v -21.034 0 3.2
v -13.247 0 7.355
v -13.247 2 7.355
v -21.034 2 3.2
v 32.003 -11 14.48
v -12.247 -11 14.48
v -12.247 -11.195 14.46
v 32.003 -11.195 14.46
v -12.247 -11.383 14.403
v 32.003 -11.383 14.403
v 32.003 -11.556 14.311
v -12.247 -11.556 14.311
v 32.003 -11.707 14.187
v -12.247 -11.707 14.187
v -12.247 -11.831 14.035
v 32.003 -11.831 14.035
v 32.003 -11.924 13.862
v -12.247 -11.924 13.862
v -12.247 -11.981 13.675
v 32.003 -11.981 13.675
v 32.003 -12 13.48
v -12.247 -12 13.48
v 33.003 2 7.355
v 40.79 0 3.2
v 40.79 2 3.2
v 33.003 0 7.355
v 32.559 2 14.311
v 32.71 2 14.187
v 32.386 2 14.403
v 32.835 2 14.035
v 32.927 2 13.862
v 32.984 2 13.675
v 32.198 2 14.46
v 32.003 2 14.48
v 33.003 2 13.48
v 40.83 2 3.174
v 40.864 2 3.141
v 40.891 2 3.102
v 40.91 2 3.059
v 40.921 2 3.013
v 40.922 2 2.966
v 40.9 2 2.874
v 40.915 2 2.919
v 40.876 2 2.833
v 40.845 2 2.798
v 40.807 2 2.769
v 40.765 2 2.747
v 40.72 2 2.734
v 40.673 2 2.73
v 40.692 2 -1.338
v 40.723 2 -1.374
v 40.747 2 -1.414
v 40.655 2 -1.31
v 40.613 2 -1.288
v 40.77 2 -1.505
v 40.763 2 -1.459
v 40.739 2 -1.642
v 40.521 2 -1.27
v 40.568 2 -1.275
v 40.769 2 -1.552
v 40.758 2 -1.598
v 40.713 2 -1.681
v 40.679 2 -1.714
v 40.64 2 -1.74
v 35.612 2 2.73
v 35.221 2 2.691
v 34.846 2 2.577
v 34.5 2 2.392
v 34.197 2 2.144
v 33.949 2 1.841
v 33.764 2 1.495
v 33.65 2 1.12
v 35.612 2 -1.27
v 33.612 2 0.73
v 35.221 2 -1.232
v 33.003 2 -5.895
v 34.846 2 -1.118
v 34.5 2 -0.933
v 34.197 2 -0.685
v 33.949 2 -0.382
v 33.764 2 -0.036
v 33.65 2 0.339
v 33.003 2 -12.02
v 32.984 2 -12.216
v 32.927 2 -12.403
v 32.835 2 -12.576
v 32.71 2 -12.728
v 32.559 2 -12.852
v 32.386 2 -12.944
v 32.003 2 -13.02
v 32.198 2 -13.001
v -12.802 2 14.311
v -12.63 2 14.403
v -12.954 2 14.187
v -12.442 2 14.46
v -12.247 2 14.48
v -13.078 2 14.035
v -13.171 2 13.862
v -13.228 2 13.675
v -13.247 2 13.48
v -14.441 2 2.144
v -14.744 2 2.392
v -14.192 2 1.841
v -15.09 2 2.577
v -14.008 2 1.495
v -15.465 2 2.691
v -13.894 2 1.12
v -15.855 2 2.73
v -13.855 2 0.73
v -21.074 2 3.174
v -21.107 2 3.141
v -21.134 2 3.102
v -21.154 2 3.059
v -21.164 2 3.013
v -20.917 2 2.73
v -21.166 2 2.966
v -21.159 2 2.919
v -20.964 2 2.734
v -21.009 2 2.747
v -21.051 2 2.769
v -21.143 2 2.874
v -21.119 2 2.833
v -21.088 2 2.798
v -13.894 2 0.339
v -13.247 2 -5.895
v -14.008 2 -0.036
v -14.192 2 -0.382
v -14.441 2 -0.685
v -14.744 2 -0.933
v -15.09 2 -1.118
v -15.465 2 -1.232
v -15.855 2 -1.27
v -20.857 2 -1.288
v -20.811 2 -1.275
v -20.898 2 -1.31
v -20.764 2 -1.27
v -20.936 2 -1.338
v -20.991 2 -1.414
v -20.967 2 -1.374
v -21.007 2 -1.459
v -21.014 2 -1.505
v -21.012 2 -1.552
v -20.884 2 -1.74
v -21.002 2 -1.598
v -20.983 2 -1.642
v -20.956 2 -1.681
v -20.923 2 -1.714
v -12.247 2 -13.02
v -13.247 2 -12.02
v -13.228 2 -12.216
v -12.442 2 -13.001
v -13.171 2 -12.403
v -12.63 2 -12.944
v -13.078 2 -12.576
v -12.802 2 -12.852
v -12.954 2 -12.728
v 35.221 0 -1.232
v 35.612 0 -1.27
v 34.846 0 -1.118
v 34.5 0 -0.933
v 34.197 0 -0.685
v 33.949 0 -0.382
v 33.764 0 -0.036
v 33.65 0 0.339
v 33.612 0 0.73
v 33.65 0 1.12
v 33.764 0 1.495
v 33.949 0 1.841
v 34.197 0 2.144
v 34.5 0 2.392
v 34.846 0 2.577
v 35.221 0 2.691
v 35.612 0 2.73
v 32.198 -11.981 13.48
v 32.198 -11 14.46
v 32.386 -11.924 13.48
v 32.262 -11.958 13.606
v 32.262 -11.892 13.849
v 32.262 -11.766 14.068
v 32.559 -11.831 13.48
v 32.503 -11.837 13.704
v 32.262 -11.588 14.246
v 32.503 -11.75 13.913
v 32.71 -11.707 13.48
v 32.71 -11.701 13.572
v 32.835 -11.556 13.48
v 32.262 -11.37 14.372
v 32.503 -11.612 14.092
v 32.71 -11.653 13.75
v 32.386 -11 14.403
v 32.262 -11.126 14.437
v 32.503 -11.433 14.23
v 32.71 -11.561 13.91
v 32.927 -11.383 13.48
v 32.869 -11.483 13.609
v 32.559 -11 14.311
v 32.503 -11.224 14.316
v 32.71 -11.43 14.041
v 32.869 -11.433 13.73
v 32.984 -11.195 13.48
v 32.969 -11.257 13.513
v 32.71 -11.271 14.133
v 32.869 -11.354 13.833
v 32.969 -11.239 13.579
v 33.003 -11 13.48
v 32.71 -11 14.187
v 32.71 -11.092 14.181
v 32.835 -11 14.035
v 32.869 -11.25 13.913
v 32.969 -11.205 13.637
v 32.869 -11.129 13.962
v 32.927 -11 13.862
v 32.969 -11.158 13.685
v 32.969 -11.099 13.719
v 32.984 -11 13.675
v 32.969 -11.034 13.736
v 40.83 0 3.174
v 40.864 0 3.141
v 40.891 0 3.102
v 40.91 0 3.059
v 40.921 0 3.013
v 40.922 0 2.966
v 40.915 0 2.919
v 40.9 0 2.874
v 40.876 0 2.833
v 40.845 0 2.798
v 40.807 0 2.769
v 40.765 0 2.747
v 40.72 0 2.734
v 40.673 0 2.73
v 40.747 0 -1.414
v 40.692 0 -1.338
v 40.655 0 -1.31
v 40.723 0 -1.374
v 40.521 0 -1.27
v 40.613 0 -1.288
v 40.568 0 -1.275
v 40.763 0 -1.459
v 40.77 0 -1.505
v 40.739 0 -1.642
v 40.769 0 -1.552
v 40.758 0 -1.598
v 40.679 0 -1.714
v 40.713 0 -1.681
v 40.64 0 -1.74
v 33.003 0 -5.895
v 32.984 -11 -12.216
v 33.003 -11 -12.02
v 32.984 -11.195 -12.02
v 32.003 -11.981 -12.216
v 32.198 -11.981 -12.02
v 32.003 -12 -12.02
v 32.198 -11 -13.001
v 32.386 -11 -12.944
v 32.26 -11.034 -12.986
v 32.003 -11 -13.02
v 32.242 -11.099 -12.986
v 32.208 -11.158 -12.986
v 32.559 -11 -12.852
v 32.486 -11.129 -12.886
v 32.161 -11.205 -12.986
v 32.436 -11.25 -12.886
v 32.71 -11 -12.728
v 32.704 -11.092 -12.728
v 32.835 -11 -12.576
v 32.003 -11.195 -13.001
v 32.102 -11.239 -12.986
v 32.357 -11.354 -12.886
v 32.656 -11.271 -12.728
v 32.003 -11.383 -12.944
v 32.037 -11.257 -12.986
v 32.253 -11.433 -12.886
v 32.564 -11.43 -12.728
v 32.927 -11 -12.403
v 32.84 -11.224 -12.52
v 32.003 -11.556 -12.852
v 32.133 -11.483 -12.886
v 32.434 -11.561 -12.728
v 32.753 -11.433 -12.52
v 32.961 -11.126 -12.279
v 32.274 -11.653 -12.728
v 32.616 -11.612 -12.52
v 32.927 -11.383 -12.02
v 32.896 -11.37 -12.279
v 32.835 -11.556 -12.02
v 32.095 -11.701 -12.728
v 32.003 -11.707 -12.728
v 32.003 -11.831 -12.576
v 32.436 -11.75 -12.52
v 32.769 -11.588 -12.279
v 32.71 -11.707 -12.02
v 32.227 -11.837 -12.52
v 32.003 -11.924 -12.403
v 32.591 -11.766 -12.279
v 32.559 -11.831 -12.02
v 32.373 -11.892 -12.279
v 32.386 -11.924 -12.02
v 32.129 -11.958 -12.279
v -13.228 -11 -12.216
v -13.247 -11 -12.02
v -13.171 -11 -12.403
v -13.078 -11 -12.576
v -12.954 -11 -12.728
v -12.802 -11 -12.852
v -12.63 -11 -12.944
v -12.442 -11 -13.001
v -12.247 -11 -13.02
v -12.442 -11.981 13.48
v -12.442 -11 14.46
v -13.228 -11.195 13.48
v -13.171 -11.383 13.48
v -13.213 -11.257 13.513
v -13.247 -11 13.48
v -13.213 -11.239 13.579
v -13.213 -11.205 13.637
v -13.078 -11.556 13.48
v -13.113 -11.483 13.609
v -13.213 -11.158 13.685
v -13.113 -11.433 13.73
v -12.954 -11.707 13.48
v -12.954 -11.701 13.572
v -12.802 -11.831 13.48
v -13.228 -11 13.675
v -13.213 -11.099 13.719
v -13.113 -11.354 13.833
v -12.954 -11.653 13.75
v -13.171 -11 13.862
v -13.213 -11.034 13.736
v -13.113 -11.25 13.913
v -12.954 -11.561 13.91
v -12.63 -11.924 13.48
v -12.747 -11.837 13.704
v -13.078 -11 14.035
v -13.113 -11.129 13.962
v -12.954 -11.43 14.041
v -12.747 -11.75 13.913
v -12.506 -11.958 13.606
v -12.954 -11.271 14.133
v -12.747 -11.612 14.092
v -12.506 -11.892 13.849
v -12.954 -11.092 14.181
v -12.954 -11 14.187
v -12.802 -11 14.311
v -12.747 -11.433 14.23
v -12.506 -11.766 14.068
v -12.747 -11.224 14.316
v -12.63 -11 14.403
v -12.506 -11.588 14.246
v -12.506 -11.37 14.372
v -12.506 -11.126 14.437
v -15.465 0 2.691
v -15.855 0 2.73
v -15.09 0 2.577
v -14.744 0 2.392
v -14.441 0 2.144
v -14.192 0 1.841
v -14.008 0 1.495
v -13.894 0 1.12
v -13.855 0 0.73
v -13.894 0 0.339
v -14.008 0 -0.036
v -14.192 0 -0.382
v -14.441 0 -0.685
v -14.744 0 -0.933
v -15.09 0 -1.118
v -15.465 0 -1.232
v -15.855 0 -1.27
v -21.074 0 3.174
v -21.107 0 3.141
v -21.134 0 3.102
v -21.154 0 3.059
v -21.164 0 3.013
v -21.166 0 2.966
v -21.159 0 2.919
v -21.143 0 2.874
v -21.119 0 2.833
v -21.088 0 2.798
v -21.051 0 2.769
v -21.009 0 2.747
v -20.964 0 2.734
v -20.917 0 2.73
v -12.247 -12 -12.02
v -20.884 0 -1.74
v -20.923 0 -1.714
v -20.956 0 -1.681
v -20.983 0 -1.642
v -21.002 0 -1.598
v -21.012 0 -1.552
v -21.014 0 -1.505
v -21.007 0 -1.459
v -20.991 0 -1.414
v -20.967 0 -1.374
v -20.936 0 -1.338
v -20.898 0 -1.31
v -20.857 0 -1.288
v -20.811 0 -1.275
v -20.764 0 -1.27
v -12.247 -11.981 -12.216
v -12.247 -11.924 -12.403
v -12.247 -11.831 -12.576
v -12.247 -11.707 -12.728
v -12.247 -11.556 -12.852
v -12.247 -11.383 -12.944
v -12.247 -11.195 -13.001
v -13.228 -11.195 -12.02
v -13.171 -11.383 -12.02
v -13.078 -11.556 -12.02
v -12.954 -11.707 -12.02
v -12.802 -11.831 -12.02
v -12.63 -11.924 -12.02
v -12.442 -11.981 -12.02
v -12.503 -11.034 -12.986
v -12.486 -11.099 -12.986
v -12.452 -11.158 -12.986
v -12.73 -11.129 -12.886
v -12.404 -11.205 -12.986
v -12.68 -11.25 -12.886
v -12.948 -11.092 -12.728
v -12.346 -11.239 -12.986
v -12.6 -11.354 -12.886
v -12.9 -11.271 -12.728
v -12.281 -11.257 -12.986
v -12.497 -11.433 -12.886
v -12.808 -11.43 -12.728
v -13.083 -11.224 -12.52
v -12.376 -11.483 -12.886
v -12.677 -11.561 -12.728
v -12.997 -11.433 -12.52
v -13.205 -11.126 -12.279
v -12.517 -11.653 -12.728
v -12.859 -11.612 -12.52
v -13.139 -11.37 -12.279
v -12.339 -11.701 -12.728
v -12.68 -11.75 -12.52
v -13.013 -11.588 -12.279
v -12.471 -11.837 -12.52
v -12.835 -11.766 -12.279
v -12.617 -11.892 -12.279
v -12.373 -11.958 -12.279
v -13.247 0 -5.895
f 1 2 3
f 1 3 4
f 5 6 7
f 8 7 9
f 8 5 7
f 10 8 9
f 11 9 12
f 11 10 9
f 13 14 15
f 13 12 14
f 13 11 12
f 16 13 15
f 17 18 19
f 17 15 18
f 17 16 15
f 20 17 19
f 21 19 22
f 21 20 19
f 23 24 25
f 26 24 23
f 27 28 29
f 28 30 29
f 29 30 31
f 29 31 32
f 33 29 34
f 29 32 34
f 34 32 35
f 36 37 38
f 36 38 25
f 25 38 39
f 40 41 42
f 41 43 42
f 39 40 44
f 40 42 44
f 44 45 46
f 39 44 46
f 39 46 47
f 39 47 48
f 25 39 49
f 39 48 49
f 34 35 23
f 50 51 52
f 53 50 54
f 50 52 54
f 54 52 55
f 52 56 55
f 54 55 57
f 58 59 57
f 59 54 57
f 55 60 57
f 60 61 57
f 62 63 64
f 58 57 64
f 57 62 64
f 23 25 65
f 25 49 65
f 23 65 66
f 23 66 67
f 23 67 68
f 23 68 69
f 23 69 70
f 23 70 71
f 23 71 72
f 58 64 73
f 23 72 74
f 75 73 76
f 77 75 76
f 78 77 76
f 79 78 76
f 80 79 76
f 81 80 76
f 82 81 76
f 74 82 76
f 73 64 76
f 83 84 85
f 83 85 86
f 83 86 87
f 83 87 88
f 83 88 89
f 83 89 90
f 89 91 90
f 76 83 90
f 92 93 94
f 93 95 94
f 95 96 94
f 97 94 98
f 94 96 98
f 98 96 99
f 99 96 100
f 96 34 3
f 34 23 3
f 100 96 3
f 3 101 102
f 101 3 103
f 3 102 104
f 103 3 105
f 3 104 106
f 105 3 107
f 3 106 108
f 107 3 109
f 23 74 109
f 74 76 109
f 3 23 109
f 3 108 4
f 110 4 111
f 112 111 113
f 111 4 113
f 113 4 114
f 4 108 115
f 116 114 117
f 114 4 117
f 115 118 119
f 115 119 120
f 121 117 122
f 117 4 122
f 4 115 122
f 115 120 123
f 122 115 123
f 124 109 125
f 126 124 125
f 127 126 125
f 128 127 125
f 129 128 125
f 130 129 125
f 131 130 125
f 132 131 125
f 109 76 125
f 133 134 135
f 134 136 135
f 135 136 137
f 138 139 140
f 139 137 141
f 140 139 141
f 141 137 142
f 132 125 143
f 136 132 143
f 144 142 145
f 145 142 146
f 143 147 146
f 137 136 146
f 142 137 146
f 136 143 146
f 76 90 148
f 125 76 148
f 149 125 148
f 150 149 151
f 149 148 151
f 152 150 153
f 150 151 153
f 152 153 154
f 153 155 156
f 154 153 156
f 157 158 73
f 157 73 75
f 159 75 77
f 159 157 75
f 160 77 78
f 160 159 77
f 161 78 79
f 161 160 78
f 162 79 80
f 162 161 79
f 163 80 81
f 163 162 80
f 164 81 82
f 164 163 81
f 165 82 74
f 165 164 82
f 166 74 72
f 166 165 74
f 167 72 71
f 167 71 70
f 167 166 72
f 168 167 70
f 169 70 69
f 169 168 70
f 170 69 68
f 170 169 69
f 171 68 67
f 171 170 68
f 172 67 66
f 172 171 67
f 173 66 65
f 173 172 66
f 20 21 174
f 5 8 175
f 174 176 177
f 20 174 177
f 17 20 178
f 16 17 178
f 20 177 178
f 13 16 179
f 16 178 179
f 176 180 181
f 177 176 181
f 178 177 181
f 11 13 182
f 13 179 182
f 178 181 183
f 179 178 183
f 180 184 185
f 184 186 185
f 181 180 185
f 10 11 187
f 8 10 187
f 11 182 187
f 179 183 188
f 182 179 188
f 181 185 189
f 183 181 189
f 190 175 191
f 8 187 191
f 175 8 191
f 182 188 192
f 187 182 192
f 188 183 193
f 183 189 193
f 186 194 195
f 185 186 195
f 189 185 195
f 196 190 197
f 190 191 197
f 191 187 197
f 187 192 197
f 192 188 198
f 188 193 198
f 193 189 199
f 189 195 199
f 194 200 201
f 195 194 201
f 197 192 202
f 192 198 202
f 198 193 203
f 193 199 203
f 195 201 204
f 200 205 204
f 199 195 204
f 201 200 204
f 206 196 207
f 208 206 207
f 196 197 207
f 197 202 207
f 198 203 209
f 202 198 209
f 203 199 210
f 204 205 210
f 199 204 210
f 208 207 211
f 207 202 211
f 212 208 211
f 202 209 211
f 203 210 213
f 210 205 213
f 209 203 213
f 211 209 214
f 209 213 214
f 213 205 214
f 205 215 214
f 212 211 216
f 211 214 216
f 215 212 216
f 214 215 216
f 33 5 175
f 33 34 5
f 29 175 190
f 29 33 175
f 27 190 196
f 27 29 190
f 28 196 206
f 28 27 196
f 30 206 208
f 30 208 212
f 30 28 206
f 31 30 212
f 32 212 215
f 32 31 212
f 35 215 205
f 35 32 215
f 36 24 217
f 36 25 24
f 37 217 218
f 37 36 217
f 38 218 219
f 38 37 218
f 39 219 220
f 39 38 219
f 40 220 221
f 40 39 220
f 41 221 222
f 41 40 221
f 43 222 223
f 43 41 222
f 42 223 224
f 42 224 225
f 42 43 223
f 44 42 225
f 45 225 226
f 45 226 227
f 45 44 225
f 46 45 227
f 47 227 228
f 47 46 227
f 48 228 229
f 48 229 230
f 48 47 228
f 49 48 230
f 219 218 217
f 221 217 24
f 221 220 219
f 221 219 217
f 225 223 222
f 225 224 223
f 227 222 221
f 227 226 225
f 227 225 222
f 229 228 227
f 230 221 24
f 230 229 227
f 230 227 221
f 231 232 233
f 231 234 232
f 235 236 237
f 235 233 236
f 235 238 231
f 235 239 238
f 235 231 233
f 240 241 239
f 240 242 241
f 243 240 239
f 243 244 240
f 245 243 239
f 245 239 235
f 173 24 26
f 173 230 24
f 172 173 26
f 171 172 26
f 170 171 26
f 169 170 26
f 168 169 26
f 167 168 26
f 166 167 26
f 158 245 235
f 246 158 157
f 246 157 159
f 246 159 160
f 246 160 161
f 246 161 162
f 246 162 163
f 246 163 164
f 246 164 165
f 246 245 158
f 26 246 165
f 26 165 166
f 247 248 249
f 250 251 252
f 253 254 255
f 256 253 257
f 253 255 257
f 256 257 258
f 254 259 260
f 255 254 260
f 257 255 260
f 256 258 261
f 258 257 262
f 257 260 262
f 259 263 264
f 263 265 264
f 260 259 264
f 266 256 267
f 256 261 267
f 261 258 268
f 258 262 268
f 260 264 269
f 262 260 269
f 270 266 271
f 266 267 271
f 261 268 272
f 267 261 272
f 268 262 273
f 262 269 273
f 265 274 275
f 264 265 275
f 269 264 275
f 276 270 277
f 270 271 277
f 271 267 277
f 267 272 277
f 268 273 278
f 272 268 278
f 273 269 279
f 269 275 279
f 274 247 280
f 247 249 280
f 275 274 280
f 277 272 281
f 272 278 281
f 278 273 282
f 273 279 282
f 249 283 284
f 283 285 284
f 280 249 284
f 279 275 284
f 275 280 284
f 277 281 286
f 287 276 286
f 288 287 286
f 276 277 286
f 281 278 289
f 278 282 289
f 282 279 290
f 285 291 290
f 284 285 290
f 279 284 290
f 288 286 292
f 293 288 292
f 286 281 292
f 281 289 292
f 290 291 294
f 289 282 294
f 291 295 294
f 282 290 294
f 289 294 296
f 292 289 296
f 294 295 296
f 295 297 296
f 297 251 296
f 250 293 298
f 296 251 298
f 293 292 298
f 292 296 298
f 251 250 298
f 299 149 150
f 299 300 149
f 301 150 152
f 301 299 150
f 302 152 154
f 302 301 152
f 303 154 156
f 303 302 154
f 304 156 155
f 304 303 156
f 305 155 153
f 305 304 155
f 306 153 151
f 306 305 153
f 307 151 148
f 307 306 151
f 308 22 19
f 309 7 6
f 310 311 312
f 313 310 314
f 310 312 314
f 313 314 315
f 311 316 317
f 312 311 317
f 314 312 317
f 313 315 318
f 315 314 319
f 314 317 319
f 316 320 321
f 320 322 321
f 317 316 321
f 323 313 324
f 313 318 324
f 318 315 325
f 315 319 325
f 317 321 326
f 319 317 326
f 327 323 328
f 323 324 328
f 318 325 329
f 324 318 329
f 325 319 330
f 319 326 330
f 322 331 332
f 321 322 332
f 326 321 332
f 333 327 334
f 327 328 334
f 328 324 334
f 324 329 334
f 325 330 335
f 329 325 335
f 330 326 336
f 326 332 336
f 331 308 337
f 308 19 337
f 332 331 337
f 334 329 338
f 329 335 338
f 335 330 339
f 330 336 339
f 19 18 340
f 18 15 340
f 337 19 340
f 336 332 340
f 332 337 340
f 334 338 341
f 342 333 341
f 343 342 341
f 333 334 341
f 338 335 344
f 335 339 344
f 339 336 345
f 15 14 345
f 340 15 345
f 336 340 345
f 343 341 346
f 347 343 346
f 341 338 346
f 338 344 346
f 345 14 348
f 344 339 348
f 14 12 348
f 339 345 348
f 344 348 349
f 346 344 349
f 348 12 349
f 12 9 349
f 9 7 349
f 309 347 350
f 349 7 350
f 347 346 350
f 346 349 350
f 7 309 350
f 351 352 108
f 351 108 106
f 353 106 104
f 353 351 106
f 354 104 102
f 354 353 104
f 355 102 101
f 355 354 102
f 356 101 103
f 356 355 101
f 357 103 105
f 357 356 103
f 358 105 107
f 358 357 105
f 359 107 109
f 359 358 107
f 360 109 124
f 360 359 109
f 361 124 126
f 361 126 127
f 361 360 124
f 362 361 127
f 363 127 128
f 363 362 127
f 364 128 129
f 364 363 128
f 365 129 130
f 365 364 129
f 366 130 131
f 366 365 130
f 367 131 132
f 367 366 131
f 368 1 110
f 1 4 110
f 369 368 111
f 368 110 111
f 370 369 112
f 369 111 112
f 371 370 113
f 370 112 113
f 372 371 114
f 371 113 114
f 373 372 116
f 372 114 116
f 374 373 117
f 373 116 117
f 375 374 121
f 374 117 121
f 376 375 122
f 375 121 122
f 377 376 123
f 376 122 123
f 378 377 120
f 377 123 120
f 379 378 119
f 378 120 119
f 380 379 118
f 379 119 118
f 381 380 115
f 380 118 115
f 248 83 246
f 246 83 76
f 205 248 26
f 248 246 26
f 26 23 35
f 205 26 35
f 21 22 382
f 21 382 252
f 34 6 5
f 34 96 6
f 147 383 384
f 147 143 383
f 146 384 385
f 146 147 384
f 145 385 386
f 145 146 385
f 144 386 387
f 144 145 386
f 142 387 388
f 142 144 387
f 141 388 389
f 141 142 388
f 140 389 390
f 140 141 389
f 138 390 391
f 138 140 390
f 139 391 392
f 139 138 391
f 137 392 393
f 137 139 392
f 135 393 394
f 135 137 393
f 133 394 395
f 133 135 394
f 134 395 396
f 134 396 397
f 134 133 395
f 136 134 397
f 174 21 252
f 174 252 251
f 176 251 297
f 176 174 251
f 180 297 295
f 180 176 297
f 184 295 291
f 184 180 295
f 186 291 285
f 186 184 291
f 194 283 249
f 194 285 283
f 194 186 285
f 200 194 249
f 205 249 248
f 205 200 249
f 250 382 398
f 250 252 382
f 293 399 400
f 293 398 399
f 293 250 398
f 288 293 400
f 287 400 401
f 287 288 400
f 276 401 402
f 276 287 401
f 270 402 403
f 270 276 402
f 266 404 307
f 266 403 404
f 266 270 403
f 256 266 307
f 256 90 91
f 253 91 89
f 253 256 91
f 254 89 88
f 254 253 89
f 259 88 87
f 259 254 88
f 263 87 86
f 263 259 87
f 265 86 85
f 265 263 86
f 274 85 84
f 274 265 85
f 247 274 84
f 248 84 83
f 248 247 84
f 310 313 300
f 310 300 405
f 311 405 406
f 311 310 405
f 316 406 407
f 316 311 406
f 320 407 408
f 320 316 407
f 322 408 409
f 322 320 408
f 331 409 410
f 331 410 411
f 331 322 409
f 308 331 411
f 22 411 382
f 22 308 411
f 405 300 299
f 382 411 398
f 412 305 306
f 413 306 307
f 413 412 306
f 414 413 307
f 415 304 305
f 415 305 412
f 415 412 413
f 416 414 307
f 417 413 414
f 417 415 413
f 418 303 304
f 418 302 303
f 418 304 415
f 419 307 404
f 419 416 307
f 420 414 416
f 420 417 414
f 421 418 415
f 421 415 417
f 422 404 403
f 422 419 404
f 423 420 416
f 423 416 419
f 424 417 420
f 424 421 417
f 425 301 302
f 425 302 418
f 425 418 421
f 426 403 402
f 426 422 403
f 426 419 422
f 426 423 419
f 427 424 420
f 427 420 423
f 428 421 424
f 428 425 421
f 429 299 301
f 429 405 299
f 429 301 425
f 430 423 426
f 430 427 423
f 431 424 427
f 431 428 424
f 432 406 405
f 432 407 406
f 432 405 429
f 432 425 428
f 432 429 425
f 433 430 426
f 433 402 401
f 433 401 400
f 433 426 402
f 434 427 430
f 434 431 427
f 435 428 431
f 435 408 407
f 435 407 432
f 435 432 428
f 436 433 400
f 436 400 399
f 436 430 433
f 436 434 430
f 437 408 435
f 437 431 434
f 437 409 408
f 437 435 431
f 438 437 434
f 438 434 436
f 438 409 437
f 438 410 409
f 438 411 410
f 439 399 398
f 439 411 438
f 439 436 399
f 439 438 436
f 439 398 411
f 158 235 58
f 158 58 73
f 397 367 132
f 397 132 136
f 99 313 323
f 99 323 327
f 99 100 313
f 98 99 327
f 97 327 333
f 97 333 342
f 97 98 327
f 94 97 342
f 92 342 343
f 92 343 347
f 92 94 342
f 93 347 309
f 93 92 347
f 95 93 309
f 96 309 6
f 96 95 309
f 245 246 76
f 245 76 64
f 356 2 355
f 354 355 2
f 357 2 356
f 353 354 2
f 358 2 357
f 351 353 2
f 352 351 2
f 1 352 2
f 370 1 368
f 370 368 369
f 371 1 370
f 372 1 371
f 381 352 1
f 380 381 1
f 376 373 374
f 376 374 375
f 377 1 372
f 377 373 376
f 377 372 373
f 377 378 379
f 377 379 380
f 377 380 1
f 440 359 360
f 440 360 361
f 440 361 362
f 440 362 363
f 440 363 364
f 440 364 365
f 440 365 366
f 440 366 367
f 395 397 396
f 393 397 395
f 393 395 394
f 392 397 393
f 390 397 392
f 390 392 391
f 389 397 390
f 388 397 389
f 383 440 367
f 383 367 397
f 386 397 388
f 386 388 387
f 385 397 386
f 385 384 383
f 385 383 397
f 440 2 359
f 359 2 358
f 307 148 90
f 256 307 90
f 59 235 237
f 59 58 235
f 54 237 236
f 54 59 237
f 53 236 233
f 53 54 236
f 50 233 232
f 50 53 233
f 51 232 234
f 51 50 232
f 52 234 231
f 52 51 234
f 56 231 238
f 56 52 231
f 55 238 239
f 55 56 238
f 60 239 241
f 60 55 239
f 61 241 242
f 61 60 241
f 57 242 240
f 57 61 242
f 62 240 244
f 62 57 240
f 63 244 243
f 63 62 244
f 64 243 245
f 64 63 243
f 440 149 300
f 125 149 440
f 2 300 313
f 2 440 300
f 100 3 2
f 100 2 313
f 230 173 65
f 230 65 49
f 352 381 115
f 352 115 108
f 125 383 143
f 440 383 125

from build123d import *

# Parameters (mm, degrees)
BOSS_EXTRUDE3_DEPTH = 2
SKETCH4_W           = 46.25
SKETCH4_H           = 27.5
BOSS_EXTRUDE4_DEPTH = 12
FILLET1_R           = 1
FILLET2_R           = 1
FILLET3_R           = 0.25


with BuildPart() as part:
    # Sketch1 → Boss-Extrude3 (new body)
    with BuildSketch(Plane(origin=(0, 0, 0), x_dir=(1, 0, 0), z_dir=(0, 1, 0))):
        with BuildLine():
            Line((33.003141421, 5.895474545), (41.503141421, 1.270474545))
            Line((41.503141421, 1.270474545), (35.611544818, 1.270474545))
            ThreePointArc((35.611544818, 1.270474545), (33.611544818, -0.729525455), (35.611544818, -2.729525455))
            Line((35.611544818, -2.729525455), (41.672555807, -2.729525455))
            Line((41.672555807, -2.729525455), (33.003141421, -7.354525455))
            Line((33.003141421, -7.354525455), (33.003141421, -14.479525455))
            Line((33.003141421, -14.479525455), (-13.246858579, -14.479525455))
            Line((-13.246858579, -14.479525455), (-13.246858579, -7.354525455))
            Line((-13.246858579, -7.354525455), (-21.916272965, -2.729525455))
            Line((-21.916272965, -2.729525455), (-15.855261975, -2.729525455))
            ThreePointArc((-15.855261975, -2.729525455), (-13.855261975, -0.729525455), (-15.855261975, 1.270474545))
            Line((-15.855261975, 1.270474545), (-21.746858579, 1.270474545))
            Line((-21.746858579, 1.270474545), (-13.246858579, 5.895474545))
            Line((-13.246858579, 5.895474545), (-13.246858579, 13.020474545))
            Line((-13.246858579, 13.020474545), (33.003141421, 13.020474545))
            Line((33.003141421, 13.020474545), (33.003141421, 5.895474545))
        make_face()
    extrude(amount=BOSS_EXTRUDE3_DEPTH)

    # Sketch4 → Boss-Extrude4 (add)
    with BuildSketch(Plane.XZ):
        with Locations((9.878141421, 0.729525455)):
            Rectangle(SKETCH4_W, SKETCH4_H)
    extrude(amount=BOSS_EXTRUDE4_DEPTH)

    # Fillet1
    fillet1_edges = [part.edges().sort_by_distance(p)[0] for p in [
        (9.878141421, -12, 14.479525455),
    ]]
    fillet(fillet1_edges, radius=FILLET1_R)

    # Fillet2
    fillet2_edges = [part.edges().sort_by_distance(p)[0] for p in [
        (-13.246858579, -4.5, 14.479525455),
        (33.003141421, -4.5, 14.479525455),
        (33.003141421, -5, -13.020474545),
        (-13.246858579, -5, -13.020474545),
        (9.878141421, -12, -13.020474545),
        (33.003141421, -12, 0.229525455),
        (-13.246858579, -12, 0.229525455),
        (-13.246858579, -11.707106781, 14.186632236),
        (33.003141421, -11.707106781, 14.186632236),
    ]]
    fillet(fillet2_edges, radius=FILLET2_R)

    # Fillet3
    fillet3_edges = [part.edges().sort_by_distance(p)[0] for p in [
        (-21.746858579, 1, -1.270474545),
        (-21.916272965, 1, 2.729525455),
        (41.672555807, 1, 2.729525455),
        (41.503141421, 1, -1.270474545),
    ]]
    fillet(fillet3_edges, radius=FILLET3_R)


solid = part.part
